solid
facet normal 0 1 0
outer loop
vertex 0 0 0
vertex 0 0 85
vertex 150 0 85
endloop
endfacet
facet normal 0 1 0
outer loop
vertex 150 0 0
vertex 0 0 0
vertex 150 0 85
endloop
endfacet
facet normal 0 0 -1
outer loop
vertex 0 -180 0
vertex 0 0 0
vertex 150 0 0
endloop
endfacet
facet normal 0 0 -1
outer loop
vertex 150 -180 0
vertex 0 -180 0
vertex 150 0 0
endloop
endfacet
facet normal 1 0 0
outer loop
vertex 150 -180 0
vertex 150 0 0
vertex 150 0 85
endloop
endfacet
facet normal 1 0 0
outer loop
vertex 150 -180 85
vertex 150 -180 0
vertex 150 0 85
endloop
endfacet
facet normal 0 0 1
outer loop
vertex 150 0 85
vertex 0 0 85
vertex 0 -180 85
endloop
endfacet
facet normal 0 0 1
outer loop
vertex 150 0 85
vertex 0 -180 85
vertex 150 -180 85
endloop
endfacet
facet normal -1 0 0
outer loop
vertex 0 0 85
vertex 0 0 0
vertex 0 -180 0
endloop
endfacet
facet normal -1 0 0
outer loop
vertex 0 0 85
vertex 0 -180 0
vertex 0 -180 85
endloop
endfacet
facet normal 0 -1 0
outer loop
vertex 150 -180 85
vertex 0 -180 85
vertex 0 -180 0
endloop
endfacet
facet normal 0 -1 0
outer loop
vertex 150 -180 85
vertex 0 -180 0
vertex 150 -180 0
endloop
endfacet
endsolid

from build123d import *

# Parameters (mm, degrees)
F0_R      = 30
F1_DEPTH  = 190
F3_DEPTH  = 25
F4_R      = 40
F5_DEPTH  = 35
F6_W      = 170
F6_H      = 170
F6_R      = 2
F7_DEPTH  = 2
F9_W      = 150
F9_H      = 85
F10_DEPTH = 180


with BuildPart() as f1:
    # F0 (on Front) → F1 (new body)
    with BuildSketch(Plane.XZ):
        Circle(F0_R)
    extrude(amount=F1_DEPTH)

    # F2 (on face) → F3 (join)
    with BuildSketch(Plane(origin=(0, 0, 0), x_dir=(-1, 0, 0), z_dir=(0, 1, 0))):
        with BuildLine():
            Line((50, 40), (0, 40))
            ThreePointArc((0, 40), (-40, 0), (0, -40))
            Line((0, -40), (50, -40))
            Line((50, -40), (50, 40))
        make_face()
    extrude(amount=-F3_DEPTH)

    # F4 (on face) → F5 (join)
    with BuildSketch(Plane.XZ.offset(25)):
        Circle(F4_R)
    extrude(amount=F5_DEPTH)


with BuildPart() as f7:
    # F6 (on Front) → F7 (new body)
    with BuildSketch(Plane.XZ):
        with Locations((85, 85)):
            Rectangle(F6_W, F6_H)
        with Locations((6.35, 4.9)):
            Circle(F6_R, mode=Mode.SUBTRACT)
        with Locations((163.83, 4.9)):
            Circle(F6_R, mode=Mode.SUBTRACT)
        with Locations((6.35, 159.84)):
            Circle(F6_R, mode=Mode.SUBTRACT)
        with Locations((163.83, 136.98)):
            Circle(F6_R, mode=Mode.SUBTRACT)
    extrude(amount=F7_DEPTH)


with BuildPart() as f10:
    # F9 (on Front) → F10 (new body)
    with BuildSketch(Plane.XZ):
        with Locations((75, 42.5)):
            Rectangle(F9_W, F9_H)
    extrude(amount=F10_DEPTH)


solid = f10.part
